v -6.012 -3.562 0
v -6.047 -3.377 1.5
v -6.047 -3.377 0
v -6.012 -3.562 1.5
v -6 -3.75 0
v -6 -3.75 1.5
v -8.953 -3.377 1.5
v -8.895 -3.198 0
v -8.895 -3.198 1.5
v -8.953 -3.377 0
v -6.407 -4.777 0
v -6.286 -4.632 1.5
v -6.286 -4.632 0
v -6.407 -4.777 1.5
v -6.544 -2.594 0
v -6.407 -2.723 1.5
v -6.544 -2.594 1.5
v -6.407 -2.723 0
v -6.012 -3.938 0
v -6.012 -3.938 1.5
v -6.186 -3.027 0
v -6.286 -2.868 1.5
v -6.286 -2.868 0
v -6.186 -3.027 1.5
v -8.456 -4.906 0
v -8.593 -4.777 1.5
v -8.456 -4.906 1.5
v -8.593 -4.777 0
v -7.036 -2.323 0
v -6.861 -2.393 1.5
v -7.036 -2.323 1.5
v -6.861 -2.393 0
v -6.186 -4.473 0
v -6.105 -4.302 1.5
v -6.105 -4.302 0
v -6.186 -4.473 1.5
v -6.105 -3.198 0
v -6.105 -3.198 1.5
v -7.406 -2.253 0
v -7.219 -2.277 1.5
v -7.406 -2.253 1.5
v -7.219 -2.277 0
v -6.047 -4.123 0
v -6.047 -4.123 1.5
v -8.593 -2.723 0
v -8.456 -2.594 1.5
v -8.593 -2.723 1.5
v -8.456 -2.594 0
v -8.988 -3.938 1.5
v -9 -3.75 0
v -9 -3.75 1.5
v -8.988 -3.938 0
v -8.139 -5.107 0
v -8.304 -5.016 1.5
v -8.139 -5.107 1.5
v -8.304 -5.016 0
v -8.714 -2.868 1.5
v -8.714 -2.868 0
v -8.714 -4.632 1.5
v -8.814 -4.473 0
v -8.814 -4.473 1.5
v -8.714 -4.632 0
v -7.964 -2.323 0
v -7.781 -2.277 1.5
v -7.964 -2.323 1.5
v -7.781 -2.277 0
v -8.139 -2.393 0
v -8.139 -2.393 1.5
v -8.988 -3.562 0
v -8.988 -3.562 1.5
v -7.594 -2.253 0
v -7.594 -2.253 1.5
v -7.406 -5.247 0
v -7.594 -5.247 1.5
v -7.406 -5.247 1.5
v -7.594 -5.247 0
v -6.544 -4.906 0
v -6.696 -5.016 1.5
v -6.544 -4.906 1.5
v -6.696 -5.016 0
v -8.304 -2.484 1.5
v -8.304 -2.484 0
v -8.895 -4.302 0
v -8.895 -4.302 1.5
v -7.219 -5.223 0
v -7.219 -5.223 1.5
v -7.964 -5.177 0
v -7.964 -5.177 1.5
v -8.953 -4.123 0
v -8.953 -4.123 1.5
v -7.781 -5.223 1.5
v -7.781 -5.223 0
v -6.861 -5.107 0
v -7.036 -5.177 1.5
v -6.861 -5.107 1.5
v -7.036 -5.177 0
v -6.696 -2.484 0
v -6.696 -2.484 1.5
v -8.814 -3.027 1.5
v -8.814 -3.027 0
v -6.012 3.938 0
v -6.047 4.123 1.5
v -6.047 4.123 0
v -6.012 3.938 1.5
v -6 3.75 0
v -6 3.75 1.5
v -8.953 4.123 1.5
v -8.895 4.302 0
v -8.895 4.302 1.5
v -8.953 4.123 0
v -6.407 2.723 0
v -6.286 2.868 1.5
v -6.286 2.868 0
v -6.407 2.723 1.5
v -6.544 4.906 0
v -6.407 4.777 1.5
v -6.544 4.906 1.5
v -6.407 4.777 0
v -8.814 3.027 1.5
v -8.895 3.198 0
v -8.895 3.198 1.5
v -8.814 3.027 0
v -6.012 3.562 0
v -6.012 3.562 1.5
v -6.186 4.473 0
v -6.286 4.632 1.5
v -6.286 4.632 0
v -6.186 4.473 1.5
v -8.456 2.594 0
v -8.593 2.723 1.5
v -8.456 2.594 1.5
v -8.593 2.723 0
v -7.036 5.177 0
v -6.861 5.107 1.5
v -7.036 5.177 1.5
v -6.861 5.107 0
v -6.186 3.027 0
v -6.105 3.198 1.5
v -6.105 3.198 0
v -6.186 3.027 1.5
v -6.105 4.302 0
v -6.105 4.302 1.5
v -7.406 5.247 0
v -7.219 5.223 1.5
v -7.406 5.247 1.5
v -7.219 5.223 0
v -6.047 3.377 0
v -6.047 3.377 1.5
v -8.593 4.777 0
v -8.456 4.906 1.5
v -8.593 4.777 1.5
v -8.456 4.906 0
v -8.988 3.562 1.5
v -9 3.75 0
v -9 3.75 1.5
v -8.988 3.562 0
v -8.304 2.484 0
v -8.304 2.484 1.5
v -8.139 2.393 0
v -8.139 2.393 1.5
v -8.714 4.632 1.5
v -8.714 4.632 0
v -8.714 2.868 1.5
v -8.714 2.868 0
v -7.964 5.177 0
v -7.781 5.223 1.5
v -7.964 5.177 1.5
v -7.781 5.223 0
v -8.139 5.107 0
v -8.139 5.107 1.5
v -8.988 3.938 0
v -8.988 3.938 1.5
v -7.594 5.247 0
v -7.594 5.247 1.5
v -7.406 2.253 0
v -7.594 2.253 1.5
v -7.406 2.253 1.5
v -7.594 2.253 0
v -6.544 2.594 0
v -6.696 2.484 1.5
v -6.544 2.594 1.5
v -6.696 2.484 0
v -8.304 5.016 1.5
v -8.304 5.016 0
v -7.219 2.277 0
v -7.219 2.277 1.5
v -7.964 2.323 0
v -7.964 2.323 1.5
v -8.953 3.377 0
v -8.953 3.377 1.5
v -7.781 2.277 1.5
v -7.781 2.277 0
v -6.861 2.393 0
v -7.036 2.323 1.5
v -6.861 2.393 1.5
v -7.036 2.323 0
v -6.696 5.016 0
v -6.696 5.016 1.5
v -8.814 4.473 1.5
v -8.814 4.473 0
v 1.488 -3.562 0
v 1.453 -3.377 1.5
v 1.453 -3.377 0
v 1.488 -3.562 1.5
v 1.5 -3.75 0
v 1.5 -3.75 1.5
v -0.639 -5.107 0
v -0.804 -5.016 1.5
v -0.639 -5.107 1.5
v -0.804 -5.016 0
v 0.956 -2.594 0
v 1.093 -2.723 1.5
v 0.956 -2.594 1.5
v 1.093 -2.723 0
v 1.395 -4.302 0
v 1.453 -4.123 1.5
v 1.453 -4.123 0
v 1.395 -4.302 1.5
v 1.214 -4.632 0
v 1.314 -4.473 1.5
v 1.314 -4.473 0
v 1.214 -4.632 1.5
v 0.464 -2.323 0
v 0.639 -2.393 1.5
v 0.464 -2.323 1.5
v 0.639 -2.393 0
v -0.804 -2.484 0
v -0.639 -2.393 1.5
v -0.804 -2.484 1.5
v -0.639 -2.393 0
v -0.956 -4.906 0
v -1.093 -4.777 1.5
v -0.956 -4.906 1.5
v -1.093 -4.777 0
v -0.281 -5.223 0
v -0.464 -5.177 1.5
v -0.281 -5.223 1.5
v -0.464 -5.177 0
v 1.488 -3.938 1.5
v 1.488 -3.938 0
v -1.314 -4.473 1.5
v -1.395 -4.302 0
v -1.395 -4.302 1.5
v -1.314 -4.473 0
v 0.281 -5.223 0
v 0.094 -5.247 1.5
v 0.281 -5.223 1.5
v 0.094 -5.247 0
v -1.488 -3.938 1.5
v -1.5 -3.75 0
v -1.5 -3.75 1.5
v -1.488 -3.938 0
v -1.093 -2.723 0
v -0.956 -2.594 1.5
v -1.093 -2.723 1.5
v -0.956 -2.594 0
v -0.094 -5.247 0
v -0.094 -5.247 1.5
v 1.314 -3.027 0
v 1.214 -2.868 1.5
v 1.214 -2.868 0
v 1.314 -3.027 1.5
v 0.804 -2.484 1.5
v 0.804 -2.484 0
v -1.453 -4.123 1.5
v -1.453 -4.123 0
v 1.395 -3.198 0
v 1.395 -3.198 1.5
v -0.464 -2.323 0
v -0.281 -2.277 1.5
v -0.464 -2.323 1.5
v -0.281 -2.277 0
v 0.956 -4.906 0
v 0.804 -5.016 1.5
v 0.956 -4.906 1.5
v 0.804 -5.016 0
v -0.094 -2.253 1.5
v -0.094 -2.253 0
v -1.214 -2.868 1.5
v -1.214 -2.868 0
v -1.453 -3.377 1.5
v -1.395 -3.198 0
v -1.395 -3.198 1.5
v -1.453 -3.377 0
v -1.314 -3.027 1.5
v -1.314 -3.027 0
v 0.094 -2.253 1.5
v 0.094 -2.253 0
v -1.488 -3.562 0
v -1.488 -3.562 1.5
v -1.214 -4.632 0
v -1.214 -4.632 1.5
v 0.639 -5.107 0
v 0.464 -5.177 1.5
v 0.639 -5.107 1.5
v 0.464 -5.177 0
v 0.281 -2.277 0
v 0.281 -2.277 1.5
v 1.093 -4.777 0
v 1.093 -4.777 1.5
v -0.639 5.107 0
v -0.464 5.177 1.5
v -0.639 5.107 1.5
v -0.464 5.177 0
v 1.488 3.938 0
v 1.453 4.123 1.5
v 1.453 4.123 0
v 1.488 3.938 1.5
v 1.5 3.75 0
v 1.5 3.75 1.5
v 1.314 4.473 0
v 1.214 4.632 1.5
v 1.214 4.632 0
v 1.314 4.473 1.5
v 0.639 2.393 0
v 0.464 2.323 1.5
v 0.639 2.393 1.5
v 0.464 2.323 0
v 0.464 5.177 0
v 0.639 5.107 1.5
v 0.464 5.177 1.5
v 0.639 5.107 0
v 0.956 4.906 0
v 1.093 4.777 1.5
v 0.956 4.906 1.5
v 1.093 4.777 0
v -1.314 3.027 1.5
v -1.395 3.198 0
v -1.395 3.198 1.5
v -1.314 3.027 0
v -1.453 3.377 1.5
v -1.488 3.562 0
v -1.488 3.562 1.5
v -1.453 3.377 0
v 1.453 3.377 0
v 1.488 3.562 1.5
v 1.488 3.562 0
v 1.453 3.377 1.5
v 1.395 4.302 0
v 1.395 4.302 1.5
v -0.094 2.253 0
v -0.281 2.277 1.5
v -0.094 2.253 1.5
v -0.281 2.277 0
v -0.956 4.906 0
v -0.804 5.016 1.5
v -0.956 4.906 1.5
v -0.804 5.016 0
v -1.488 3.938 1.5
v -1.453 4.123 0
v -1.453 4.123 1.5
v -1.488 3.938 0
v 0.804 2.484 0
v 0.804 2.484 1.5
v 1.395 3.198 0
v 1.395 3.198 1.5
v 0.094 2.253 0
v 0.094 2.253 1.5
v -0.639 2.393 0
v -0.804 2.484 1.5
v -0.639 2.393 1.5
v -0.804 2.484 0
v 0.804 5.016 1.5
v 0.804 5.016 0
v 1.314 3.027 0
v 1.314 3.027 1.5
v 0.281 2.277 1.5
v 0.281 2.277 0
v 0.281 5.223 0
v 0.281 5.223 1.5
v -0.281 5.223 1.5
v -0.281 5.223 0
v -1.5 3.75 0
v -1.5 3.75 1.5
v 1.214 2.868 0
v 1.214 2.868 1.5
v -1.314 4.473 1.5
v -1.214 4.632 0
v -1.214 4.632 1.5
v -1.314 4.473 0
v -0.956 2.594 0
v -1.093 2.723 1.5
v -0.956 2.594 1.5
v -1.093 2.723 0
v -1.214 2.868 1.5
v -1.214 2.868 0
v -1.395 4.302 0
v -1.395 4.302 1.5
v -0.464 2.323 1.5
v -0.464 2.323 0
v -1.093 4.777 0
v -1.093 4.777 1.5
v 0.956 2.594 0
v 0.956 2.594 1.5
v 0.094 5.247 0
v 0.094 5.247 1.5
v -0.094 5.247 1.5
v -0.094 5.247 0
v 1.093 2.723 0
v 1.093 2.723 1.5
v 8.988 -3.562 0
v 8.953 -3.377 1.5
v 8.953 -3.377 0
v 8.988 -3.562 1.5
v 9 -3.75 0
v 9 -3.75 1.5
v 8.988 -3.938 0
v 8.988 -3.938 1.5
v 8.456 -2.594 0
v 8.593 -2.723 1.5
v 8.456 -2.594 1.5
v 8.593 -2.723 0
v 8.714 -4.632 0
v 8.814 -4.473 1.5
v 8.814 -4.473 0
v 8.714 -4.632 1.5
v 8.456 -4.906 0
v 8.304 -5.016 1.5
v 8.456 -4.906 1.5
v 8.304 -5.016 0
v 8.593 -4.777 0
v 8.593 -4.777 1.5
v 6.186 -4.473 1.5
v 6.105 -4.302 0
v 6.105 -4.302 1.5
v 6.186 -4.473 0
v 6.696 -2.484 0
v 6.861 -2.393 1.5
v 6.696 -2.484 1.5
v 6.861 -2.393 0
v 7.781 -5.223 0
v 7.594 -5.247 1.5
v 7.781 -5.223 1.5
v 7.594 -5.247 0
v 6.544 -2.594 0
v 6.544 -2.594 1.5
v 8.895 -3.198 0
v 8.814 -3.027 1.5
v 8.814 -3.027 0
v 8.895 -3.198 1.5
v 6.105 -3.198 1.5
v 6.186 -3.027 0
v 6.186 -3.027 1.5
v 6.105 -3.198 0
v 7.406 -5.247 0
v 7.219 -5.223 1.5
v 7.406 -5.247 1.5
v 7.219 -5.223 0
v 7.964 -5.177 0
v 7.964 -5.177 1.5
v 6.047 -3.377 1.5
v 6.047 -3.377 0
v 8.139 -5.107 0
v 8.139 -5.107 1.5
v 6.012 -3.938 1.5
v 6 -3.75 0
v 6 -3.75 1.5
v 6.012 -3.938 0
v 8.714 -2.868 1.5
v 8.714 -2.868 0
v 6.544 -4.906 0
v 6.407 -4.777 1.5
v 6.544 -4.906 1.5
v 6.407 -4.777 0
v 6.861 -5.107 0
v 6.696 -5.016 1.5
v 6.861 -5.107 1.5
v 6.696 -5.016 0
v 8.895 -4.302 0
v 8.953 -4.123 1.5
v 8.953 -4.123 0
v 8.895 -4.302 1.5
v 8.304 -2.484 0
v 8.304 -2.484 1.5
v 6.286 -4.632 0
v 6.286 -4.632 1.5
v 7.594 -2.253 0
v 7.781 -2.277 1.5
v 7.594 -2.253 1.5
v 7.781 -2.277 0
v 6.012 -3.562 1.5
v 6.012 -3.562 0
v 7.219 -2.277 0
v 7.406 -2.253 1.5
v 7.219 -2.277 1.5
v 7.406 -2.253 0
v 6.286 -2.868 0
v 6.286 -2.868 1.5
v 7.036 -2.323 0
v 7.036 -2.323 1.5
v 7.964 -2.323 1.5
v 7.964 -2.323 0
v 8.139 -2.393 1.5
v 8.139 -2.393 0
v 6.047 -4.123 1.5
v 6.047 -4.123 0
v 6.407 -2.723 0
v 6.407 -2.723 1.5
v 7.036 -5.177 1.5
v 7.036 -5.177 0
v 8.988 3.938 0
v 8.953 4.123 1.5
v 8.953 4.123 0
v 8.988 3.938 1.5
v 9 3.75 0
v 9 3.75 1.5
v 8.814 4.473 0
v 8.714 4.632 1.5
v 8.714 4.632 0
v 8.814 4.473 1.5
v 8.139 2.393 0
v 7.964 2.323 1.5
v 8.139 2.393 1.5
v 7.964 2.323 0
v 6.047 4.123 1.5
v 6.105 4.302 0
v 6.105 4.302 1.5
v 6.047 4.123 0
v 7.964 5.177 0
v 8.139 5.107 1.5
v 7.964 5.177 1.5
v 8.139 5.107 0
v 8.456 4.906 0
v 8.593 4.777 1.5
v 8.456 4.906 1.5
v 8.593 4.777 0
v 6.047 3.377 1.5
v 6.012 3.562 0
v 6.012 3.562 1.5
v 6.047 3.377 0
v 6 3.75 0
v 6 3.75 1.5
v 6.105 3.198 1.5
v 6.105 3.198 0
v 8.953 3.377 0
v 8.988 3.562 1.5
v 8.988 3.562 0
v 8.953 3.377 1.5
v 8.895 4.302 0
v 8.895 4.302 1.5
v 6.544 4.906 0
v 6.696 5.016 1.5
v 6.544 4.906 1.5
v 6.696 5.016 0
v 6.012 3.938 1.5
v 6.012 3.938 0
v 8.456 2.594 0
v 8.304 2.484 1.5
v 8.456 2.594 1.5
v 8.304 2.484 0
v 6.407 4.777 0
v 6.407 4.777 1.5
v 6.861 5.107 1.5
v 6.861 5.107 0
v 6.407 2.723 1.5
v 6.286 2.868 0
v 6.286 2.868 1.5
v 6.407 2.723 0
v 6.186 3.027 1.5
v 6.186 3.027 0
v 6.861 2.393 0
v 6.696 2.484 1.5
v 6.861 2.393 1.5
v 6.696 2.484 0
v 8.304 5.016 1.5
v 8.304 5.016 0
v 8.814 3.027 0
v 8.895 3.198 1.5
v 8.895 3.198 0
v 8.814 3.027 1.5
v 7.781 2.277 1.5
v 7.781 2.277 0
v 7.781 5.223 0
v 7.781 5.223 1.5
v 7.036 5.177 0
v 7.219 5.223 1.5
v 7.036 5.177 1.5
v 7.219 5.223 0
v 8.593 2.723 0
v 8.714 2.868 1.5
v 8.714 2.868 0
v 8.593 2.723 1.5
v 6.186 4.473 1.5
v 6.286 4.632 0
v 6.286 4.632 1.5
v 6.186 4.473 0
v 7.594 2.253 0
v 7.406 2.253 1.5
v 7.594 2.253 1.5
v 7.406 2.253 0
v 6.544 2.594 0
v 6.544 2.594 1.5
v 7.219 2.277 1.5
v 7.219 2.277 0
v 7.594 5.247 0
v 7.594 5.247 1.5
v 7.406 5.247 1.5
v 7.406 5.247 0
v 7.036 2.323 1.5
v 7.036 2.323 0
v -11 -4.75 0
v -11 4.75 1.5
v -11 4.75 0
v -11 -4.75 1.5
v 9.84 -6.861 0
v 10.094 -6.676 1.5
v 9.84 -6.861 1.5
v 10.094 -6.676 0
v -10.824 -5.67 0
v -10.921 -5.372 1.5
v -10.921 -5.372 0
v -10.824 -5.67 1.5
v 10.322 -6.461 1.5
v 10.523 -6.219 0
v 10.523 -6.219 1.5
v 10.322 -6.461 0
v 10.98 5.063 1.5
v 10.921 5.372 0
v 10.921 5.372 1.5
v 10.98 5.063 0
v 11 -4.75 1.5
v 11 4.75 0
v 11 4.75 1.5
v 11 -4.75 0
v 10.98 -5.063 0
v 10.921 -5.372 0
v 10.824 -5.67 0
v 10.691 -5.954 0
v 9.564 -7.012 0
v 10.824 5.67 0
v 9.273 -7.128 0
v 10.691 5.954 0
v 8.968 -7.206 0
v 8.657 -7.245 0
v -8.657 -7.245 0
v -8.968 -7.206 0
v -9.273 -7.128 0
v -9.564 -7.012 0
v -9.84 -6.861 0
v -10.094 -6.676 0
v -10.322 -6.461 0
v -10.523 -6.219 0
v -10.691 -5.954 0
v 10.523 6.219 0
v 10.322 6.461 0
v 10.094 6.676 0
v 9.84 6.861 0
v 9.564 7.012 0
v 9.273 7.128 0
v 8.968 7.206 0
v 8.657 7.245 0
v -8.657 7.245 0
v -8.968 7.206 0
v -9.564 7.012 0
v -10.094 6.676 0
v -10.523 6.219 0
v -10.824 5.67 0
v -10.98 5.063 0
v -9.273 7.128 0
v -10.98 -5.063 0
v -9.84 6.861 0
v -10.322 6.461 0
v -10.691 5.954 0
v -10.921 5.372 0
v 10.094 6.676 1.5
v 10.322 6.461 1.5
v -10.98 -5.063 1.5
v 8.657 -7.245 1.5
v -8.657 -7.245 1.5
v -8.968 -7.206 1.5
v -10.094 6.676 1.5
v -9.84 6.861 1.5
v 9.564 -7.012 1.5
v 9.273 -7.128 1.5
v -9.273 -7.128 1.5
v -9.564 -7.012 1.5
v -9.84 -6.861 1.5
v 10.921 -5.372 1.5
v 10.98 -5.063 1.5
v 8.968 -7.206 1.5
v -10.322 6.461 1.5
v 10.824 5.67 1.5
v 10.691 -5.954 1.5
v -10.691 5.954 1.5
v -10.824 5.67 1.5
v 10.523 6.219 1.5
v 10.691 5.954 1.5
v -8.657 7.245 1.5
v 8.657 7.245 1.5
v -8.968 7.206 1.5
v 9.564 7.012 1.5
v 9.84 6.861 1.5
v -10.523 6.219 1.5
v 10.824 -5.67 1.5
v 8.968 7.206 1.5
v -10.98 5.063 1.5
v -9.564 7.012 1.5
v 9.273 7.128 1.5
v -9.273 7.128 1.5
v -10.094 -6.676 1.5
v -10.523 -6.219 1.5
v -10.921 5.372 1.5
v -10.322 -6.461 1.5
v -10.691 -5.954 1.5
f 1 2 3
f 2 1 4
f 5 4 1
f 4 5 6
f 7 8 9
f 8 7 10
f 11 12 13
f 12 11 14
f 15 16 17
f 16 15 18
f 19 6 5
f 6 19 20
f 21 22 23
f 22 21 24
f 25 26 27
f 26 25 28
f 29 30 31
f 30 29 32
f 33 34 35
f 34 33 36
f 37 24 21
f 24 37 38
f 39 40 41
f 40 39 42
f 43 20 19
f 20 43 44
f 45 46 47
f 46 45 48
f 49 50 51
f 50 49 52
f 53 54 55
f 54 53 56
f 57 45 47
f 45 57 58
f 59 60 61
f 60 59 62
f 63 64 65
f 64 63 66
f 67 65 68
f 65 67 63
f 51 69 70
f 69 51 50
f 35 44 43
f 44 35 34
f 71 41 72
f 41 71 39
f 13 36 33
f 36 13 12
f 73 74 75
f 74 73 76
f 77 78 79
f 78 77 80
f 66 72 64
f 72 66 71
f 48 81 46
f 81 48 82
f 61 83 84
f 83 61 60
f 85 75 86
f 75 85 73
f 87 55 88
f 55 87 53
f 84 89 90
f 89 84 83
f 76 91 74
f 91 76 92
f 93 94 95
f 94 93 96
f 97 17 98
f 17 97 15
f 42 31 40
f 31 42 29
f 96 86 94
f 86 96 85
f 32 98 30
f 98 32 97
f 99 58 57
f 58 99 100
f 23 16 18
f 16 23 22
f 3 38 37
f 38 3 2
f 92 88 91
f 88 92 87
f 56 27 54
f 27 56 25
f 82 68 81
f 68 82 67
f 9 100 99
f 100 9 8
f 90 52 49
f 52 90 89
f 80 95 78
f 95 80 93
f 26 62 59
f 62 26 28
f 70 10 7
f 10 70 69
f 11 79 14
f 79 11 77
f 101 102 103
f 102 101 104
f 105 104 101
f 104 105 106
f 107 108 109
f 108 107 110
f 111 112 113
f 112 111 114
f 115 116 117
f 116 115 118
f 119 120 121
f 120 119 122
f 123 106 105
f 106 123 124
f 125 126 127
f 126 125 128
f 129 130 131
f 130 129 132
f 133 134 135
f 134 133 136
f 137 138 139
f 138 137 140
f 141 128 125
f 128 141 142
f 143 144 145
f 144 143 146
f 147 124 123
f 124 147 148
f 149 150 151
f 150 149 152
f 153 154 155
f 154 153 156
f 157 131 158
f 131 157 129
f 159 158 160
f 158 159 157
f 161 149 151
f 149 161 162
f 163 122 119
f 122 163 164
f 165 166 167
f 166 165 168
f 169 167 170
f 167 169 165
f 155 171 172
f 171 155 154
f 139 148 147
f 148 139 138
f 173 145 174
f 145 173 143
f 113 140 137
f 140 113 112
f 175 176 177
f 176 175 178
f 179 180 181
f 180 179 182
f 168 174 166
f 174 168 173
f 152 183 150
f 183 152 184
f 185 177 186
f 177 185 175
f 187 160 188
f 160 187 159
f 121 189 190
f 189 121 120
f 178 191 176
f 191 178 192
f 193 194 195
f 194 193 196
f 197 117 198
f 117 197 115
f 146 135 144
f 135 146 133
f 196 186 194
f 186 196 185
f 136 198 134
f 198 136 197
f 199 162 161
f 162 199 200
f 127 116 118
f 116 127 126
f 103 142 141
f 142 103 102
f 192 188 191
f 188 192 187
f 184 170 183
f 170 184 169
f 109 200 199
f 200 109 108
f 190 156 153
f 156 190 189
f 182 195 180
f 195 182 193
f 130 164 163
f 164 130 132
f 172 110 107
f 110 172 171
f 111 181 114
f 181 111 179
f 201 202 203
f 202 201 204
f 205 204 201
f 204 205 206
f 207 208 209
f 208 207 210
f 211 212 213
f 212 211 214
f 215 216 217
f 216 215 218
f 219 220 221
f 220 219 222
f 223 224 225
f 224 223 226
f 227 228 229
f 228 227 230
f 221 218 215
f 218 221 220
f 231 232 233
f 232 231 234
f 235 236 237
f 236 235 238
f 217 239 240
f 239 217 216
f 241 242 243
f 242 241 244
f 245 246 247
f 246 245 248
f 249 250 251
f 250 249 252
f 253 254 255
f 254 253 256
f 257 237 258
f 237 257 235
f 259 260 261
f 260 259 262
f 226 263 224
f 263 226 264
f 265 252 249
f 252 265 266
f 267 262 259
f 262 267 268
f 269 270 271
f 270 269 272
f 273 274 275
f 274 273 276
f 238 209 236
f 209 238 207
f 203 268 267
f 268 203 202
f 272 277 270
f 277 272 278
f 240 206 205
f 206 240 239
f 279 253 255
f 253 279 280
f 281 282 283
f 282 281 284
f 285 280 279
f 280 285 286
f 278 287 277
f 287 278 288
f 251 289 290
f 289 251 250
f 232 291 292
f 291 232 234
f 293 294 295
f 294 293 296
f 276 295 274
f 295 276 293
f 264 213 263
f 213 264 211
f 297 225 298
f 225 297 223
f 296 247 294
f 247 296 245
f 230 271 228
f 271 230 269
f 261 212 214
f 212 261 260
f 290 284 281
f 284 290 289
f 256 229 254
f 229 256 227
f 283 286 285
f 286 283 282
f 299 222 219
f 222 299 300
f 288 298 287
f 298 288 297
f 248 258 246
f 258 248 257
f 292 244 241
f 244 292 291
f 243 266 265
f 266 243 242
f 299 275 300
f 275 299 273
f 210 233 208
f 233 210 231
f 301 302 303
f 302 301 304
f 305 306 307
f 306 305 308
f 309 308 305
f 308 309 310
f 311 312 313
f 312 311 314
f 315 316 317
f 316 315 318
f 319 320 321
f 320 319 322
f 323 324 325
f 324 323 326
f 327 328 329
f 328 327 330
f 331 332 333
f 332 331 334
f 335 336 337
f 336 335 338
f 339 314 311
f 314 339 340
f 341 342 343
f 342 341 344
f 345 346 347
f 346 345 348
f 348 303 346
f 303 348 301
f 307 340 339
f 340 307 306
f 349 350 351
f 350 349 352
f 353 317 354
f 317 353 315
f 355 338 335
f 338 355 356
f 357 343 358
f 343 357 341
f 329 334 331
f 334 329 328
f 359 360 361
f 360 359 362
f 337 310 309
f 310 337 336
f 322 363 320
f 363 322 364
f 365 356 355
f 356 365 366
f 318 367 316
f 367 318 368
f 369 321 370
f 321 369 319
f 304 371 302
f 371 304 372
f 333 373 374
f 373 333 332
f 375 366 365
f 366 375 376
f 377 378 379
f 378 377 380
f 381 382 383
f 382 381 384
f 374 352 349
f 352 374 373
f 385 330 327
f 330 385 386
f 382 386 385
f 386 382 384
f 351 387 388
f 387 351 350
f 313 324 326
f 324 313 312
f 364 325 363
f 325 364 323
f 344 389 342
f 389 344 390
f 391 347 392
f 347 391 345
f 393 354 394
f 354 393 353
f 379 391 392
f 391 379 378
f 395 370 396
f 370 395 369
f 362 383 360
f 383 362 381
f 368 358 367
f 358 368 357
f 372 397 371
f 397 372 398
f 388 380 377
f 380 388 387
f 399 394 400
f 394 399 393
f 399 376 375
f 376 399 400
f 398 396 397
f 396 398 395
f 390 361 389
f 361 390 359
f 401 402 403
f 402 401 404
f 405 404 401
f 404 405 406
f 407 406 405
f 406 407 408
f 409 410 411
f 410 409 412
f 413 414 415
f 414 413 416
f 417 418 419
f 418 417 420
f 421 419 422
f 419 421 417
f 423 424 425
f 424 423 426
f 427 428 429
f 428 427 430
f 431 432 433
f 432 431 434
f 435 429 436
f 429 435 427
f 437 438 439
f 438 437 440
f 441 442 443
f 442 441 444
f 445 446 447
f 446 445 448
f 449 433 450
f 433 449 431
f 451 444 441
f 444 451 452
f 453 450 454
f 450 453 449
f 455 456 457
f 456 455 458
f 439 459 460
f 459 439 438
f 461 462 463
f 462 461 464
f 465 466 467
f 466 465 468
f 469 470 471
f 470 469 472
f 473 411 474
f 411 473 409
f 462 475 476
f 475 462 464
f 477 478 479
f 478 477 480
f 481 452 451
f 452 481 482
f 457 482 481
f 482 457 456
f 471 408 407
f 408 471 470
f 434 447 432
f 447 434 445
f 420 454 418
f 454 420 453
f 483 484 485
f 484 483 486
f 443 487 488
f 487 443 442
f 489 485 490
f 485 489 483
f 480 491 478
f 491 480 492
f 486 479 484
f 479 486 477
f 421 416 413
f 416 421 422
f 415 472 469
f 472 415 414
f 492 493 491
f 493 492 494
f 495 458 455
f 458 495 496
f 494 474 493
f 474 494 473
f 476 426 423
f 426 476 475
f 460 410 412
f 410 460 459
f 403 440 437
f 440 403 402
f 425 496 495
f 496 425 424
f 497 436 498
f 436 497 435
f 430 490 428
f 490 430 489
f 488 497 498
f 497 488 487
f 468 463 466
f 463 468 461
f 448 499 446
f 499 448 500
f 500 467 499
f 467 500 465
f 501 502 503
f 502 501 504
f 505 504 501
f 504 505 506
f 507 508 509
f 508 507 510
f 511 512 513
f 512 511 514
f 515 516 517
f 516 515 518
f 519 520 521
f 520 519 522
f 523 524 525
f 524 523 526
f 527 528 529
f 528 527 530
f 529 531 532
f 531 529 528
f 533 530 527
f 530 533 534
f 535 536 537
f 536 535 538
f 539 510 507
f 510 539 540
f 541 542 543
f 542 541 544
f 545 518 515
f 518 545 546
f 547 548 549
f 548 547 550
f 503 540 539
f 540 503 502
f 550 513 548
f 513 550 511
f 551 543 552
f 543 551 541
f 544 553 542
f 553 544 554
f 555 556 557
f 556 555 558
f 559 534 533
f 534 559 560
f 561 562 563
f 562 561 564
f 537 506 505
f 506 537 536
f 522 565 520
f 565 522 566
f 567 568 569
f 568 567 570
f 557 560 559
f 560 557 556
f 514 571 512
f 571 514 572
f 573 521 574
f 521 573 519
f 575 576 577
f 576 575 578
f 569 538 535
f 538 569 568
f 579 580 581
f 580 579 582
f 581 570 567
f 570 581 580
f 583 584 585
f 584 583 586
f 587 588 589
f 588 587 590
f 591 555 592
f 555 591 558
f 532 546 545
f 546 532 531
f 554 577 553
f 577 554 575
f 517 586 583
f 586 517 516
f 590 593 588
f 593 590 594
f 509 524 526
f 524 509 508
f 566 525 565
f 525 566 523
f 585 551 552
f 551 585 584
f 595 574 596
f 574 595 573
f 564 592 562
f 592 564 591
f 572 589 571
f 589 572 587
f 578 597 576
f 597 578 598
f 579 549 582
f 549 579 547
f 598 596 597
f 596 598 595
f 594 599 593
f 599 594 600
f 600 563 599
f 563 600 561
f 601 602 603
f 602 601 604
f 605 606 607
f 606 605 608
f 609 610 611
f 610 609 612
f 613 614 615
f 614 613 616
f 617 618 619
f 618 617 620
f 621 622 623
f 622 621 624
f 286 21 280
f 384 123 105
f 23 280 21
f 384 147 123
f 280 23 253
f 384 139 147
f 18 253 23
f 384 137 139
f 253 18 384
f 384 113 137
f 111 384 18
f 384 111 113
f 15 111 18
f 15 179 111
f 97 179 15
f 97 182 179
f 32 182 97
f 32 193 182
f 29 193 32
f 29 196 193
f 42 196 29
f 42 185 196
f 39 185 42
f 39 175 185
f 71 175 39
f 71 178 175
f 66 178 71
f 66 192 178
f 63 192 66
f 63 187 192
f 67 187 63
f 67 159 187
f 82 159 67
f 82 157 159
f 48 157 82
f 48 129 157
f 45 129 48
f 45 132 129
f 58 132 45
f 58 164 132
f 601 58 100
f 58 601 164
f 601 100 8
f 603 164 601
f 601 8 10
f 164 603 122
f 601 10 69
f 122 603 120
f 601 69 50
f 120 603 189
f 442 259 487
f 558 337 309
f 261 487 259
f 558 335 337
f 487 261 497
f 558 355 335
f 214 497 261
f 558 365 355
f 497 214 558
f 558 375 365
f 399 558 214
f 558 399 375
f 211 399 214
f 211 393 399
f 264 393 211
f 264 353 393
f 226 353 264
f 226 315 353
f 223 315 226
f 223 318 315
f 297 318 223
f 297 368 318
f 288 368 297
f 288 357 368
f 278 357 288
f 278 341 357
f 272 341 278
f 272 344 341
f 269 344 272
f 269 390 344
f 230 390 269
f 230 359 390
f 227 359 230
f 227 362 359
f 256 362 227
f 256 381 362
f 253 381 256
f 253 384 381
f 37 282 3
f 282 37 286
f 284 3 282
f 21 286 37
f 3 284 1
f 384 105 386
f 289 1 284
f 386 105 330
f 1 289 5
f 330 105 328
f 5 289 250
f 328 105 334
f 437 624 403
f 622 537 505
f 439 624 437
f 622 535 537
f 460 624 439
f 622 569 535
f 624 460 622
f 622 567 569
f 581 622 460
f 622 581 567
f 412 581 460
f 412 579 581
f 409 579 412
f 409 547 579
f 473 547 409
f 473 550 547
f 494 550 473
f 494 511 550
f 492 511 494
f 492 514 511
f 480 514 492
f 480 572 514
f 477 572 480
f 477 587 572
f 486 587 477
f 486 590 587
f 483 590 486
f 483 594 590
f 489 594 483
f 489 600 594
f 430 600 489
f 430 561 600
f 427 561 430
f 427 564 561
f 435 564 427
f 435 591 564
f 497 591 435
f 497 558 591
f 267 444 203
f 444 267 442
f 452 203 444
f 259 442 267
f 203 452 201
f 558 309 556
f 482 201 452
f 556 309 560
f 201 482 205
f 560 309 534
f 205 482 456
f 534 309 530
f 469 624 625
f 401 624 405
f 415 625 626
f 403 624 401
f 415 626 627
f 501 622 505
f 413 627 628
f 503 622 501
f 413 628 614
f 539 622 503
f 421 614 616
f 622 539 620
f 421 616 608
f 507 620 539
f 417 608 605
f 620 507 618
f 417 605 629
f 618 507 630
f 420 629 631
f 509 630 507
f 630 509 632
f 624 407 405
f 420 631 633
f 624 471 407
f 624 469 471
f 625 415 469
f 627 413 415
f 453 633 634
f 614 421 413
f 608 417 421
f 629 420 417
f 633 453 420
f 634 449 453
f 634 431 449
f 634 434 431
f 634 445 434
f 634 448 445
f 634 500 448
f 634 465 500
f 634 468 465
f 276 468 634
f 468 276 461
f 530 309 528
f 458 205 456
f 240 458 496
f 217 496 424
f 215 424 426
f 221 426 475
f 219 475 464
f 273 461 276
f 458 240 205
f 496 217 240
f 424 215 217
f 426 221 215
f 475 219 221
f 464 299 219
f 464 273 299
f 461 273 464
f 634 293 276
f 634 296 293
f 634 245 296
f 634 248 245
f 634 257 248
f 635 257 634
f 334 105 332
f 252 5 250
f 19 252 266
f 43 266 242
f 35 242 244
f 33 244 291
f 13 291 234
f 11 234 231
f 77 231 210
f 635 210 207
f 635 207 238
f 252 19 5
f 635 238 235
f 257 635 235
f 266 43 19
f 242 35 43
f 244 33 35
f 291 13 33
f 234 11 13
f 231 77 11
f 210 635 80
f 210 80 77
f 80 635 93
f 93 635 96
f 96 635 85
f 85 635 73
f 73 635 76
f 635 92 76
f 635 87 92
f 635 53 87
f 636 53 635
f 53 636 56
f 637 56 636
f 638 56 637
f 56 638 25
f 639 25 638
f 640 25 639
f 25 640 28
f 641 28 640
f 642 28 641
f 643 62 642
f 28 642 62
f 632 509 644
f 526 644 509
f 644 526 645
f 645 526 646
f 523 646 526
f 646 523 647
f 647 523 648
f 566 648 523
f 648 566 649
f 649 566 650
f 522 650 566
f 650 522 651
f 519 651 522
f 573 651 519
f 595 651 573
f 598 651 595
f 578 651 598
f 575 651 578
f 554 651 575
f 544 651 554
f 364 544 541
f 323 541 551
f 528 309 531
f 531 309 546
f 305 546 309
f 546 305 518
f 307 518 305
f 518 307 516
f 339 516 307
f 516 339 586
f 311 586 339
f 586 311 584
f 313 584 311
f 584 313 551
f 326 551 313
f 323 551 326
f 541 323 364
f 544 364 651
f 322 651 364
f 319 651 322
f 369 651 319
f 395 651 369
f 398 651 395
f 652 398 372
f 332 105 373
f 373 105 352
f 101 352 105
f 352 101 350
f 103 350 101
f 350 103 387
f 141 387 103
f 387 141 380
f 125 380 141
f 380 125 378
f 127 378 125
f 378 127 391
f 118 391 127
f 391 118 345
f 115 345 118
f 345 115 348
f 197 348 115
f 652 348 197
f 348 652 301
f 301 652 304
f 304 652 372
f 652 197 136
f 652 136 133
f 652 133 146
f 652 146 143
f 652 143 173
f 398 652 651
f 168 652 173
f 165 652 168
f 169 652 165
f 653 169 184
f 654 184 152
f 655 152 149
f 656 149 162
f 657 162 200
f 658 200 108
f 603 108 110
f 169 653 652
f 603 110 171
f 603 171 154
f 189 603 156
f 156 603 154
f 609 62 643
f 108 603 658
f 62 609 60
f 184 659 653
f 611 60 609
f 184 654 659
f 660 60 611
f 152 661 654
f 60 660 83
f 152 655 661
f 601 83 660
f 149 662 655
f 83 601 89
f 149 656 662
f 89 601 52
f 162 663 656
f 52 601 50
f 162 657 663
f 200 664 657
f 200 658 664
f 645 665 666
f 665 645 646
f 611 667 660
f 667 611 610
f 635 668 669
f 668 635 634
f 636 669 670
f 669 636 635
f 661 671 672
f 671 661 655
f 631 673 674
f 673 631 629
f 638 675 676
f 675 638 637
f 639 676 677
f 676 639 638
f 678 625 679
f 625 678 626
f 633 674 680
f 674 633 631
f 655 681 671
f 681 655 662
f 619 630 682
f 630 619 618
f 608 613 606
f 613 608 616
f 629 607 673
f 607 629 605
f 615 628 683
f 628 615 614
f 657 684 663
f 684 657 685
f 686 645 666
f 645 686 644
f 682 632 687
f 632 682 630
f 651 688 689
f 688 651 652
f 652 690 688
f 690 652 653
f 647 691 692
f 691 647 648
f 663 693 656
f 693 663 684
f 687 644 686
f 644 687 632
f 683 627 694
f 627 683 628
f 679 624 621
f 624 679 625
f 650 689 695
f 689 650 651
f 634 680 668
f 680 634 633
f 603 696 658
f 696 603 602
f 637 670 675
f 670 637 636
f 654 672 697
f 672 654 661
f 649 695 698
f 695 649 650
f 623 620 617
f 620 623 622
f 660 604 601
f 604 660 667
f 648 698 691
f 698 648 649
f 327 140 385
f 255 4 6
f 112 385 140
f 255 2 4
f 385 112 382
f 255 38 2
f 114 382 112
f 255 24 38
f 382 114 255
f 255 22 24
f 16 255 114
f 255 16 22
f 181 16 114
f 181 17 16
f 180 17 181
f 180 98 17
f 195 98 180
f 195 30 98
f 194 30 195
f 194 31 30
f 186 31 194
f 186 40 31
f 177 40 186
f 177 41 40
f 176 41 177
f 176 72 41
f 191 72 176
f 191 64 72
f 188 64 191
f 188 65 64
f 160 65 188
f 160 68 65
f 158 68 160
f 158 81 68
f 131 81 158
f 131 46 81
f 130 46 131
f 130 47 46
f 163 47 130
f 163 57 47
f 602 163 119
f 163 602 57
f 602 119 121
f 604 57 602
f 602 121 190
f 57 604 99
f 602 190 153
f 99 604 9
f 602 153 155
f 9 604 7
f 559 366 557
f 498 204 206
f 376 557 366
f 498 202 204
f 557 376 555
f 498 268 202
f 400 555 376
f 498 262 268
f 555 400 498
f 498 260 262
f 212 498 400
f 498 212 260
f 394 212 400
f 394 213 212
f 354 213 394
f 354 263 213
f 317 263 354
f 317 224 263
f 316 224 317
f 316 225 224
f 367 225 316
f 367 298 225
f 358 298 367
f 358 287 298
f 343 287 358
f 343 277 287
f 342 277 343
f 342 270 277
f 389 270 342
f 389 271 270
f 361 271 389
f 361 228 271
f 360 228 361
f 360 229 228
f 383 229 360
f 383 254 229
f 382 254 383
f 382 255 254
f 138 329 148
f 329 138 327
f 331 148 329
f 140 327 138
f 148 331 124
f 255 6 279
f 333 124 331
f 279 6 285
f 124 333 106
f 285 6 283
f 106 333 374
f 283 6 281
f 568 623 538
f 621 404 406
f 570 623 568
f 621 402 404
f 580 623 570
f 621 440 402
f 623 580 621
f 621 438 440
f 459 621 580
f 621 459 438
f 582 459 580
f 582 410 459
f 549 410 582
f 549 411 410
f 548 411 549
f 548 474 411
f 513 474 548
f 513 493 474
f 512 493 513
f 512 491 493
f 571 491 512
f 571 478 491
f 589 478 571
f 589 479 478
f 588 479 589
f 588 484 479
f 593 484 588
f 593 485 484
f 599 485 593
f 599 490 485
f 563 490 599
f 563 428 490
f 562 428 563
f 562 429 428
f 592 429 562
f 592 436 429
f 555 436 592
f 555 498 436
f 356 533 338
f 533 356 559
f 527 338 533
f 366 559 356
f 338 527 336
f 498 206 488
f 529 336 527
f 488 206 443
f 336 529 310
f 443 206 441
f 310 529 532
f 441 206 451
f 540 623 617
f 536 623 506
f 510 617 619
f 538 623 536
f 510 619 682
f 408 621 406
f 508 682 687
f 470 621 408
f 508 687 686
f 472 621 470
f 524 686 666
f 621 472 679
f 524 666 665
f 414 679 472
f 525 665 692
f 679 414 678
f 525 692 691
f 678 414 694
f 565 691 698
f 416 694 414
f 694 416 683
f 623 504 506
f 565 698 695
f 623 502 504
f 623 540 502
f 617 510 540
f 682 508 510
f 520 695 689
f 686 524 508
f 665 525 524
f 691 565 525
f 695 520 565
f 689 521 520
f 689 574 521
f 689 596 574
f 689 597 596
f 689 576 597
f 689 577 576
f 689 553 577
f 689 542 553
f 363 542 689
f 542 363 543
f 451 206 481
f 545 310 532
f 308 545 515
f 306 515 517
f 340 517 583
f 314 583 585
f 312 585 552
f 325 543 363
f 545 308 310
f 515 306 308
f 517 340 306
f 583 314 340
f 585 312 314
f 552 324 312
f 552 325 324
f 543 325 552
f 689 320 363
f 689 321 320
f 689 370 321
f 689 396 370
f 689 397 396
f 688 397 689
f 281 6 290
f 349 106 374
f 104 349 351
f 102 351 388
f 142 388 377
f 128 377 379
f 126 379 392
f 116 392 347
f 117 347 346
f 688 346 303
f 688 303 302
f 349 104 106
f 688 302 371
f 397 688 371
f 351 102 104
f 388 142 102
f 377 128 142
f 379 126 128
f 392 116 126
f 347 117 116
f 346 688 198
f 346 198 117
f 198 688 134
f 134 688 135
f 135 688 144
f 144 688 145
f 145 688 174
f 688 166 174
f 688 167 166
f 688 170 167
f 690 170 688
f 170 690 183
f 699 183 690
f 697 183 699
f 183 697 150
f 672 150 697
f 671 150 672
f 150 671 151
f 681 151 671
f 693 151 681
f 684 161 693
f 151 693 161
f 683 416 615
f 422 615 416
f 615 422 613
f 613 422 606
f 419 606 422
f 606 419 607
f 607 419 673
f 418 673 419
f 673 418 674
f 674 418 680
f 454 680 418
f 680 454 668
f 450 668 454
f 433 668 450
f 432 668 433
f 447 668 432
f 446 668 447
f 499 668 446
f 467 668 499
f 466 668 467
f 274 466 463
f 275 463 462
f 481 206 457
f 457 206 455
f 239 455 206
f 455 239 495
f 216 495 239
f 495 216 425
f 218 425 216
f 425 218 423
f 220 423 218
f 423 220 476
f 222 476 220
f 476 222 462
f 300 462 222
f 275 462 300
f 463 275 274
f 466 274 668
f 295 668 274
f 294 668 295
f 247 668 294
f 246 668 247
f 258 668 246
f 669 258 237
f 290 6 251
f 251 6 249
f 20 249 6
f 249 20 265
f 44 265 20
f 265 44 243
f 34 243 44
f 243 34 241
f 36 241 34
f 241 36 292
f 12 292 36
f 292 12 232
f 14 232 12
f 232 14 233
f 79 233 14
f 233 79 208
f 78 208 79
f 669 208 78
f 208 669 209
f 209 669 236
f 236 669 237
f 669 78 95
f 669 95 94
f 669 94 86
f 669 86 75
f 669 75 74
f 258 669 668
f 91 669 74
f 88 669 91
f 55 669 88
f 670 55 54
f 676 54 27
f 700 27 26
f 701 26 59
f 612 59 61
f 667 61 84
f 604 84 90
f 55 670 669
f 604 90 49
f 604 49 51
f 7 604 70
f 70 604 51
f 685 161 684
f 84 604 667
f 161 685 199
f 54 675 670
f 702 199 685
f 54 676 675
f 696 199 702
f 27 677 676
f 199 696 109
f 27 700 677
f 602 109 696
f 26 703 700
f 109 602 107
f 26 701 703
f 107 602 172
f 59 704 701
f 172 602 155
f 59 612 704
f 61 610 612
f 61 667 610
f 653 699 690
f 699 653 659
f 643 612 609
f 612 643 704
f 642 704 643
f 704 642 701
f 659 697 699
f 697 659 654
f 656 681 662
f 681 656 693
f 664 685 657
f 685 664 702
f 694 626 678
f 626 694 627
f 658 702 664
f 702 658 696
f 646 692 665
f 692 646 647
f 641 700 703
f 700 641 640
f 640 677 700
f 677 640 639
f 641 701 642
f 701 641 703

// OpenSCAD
$fn = 50;


difference() {
	union() {
		translate(v = [0, 0, 0]) {
			rotate(a = [0, 0, 0]) {
				hull() {
					translate(v = [-8.5000000000, 4.7500000000, 0]) {
						rotate(a = [0, 0, 0]) {
							translate(v = [0, 0, 0]) {
								rotate(a = [0, 0, 0]) {
									cylinder(h = 1.5000000000, r = 2.5000000000);
								}
							}
						}
					}
					translate(v = [8.5000000000, 4.7500000000, 0]) {
						rotate(a = [0, 0, 0]) {
							translate(v = [0, 0, 0]) {
								rotate(a = [0, 0, 0]) {
									cylinder(h = 1.5000000000, r = 2.5000000000);
								}
							}
						}
					}
					translate(v = [-8.5000000000, -4.7500000000, 0]) {
						rotate(a = [0, 0, 0]) {
							translate(v = [0, 0, 0]) {
								rotate(a = [0, 0, 0]) {
									cylinder(h = 1.5000000000, r = 2.5000000000);
								}
							}
						}
					}
					translate(v = [8.5000000000, -4.7500000000, 0]) {
						rotate(a = [0, 0, 0]) {
							translate(v = [0, 0, 0]) {
								rotate(a = [0, 0, 0]) {
									cylinder(h = 1.5000000000, r = 2.5000000000);
								}
							}
						}
					}
				}
			}
		}
	}
	union() {
		translate(v = [-7.5000000000, -3.7500000000, 0]) {
			rotate(a = [0, 0, 0]) {
				translate(v = [0, 0, -50]) {
					rotate(a = [0, 0, 0]) {
						cylinder(h = 100, r = 1.5000000000);
					}
				}
			}
		}
		translate(v = [-7.5000000000, 3.7500000000, 0]) {
			rotate(a = [0, 0, 0]) {
				translate(v = [0, 0, -50]) {
					rotate(a = [0, 0, 0]) {
						cylinder(h = 100, r = 1.5000000000);
					}
				}
			}
		}
		translate(v = [0.0000000000, -3.7500000000, 0]) {
			rotate(a = [0, 0, 0]) {
				translate(v = [0, 0, -50]) {
					rotate(a = [0, 0, 0]) {
						cylinder(h = 100, r = 1.5000000000);
					}
				}
			}
		}
		translate(v = [0.0000000000, 3.7500000000, 0]) {
			rotate(a = [0, 0, 0]) {
				translate(v = [0, 0, -50]) {
					rotate(a = [0, 0, 0]) {
						cylinder(h = 100, r = 1.5000000000);
					}
				}
			}
		}
		translate(v = [7.5000000000, -3.7500000000, 0]) {
			rotate(a = [0, 0, 0]) {
				translate(v = [0, 0, -50]) {
					rotate(a = [0, 0, 0]) {
						cylinder(h = 100, r = 1.5000000000);
					}
				}
			}
		}
		translate(v = [7.5000000000, 3.7500000000, 0]) {
			rotate(a = [0, 0, 0]) {
				translate(v = [0, 0, -50]) {
					rotate(a = [0, 0, 0]) {
						cylinder(h = 100, r = 1.5000000000);
					}
				}
			}
		}
	}
}
